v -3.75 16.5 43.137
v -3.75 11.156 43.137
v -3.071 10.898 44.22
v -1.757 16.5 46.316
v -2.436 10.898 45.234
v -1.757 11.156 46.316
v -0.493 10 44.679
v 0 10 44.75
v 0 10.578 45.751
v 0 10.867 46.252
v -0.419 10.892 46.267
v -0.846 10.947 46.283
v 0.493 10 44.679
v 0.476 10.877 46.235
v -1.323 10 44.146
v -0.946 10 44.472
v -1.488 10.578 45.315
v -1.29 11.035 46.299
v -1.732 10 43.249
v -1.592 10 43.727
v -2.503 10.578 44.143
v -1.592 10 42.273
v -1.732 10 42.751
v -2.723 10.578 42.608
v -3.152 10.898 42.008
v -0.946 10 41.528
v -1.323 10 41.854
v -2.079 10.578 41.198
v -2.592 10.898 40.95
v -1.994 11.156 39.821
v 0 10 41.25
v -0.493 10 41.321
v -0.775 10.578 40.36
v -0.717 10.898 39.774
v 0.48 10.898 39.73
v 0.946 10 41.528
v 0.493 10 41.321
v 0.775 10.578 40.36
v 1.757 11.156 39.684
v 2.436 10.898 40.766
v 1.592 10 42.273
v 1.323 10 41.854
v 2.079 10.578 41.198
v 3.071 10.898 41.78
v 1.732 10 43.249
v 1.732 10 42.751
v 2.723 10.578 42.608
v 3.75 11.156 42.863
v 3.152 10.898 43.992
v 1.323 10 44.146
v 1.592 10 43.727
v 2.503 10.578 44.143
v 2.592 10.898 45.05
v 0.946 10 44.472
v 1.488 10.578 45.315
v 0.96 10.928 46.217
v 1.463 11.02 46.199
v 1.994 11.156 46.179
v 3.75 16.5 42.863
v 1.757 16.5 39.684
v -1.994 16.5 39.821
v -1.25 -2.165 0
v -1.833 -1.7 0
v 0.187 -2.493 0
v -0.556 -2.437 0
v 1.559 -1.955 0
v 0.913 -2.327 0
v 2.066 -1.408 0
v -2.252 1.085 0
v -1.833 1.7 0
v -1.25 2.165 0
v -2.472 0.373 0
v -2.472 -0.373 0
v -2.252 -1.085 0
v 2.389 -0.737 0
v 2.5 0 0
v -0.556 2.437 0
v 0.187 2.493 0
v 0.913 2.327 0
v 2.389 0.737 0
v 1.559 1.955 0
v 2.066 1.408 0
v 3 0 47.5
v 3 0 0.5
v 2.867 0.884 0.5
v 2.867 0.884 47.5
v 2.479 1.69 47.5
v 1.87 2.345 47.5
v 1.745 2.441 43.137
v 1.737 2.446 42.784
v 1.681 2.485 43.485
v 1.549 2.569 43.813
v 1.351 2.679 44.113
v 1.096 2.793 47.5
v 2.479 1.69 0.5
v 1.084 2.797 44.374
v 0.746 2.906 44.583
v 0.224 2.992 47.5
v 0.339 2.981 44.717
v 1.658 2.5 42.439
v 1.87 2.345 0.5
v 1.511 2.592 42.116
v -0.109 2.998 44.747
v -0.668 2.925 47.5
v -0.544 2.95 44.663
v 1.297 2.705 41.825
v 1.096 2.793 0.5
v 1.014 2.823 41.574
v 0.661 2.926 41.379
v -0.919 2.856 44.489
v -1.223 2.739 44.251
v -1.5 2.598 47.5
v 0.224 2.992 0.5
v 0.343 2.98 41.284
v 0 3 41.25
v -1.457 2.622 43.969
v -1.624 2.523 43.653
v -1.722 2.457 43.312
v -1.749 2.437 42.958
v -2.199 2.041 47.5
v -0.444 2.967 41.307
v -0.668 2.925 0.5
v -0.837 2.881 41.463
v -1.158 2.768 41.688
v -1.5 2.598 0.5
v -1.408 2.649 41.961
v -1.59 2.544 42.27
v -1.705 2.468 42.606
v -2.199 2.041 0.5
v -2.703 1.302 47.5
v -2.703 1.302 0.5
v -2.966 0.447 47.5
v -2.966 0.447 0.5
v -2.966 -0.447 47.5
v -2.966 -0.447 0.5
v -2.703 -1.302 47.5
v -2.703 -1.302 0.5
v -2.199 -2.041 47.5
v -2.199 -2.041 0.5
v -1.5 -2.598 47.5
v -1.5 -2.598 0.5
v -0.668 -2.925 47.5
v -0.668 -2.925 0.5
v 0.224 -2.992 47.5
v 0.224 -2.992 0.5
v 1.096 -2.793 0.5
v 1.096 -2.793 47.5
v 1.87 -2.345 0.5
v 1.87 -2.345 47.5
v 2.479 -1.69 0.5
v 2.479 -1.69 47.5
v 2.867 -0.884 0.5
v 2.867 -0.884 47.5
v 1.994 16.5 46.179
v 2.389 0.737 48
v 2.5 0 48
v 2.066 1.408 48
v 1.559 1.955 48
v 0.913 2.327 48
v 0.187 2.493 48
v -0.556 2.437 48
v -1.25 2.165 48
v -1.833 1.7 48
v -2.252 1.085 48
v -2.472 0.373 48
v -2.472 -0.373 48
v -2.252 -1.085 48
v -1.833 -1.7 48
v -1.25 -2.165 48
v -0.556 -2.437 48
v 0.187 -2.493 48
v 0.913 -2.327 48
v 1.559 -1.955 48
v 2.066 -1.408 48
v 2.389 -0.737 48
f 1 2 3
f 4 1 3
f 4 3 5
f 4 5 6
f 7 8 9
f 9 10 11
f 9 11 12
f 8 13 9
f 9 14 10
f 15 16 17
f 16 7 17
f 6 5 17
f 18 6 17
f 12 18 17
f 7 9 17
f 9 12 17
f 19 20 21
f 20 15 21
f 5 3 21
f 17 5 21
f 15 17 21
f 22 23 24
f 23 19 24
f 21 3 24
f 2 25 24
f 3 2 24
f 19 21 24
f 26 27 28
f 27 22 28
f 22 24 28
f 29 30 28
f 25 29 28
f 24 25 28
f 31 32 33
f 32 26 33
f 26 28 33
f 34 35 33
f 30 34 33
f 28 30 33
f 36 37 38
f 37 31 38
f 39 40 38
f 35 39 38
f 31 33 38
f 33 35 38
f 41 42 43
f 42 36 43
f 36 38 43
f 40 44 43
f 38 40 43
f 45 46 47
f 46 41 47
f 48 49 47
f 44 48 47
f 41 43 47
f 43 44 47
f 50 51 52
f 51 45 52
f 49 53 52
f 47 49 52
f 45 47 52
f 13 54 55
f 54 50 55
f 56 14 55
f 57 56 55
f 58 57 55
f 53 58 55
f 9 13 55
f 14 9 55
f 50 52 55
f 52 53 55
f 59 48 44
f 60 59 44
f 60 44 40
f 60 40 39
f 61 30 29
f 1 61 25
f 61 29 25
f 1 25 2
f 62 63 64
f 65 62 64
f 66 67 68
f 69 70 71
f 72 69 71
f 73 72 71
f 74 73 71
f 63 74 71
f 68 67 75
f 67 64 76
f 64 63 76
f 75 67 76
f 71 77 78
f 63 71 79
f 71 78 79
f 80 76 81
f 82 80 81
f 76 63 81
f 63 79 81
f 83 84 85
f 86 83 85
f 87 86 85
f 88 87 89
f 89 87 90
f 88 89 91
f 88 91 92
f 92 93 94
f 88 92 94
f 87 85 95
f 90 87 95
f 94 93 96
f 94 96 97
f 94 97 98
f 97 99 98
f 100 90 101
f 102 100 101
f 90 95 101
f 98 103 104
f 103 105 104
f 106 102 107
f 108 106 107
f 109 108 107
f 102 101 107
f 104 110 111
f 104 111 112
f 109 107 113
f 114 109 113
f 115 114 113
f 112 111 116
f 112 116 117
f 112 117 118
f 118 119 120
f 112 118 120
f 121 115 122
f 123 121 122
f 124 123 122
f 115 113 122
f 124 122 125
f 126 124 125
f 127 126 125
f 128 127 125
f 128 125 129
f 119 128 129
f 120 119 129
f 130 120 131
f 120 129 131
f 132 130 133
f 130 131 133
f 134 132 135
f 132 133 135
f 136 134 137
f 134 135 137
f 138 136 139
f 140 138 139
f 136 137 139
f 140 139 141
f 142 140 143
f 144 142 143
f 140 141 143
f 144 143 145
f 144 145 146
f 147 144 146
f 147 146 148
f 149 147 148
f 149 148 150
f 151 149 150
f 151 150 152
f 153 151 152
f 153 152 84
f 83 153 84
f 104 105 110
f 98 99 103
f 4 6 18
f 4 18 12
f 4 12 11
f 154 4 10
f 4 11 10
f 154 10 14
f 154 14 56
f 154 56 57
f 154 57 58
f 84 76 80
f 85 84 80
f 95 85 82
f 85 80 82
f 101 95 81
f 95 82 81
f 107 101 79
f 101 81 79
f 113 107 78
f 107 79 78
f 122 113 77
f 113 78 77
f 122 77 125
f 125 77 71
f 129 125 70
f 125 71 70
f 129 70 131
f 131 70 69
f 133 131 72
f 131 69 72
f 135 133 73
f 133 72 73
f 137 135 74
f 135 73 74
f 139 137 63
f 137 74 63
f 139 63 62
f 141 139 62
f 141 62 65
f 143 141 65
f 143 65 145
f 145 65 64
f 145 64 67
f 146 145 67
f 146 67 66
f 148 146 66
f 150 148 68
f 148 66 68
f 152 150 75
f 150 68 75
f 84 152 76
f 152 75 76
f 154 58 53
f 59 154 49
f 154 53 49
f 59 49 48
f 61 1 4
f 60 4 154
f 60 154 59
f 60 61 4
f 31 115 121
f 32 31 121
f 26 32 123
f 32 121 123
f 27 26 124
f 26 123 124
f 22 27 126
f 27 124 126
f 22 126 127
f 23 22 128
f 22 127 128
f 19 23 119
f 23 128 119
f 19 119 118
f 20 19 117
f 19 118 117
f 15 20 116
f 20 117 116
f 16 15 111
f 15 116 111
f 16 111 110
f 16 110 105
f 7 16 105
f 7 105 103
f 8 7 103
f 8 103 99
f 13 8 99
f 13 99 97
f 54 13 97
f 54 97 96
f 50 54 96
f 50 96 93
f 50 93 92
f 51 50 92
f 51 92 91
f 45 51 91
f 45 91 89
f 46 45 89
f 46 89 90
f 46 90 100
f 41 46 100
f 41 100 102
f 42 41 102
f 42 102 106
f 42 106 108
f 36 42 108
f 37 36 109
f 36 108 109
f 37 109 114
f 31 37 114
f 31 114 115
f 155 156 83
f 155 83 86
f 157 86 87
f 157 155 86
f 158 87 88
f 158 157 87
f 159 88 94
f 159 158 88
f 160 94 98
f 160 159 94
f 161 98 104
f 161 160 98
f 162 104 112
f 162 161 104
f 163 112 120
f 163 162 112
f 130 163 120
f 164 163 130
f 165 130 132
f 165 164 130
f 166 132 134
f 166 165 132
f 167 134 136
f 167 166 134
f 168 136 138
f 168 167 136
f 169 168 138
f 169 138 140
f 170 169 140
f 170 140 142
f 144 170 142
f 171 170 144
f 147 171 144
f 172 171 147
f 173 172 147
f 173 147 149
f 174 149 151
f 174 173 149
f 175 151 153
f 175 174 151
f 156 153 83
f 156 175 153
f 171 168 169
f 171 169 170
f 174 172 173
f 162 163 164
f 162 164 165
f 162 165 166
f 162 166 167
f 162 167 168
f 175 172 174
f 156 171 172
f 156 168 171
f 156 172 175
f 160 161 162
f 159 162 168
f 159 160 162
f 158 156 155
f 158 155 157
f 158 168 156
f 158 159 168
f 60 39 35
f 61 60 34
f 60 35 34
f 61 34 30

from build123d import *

# Parameters (mm, degrees)
SKETCH_1_R      = 3
EXTRUDE_1_DEPTH = 48
SKETCH_2_R      = 1.75
EXTRUDE_2_DEPTH = 10
EXTRUDE_3_DEPTH = 6.5
CHAMFER_1_SIZE  = 0.5


with BuildPart() as part:
    # 草图1 → 凸台-拉伸1 (new body)
    with BuildSketch(Plane.XY):
        Circle(SKETCH_1_R)
    extrude(amount=EXTRUDE_1_DEPTH)

    # 草图2 → 凸台-拉伸2 (add)
    with BuildSketch(Plane(origin=(0, 0, 0), x_dir=(1, 0, 0), z_dir=(0, 1, 0))):
        with Locations(Location((0, -43, 0), (0, 0, 90))):
            Circle(SKETCH_2_R)
    extrude(amount=EXTRUDE_2_DEPTH)

    # 草图3 → 凸台-拉伸3 (add)
    with BuildSketch(Plane(origin=(0, 10, 0), x_dir=(1, 0, 0), z_dir=(0, 1, 0))):
        Polygon((-1.993644271, -39.820579321), (-3.750281213, -43.136836245), (-1.756636942, -46.316256924), (1.993644271, -46.179420679), (3.750281213, -42.863163755), (1.756636942, -39.683743076), align=None)
    extrude(amount=EXTRUDE_3_DEPTH)

    # 草图4 → 切除-旋转1 (revolve, cut)
    with BuildSketch(Plane(origin=(0, 0, 0), x_dir=(0, 0, -1), z_dir=(1, 0, 0))):
        Polygon((-44.75, 10), (-47.118639965, 11.367534921), (-47.118639965, 10), align=None)
    revolve(axis=Axis((0, 10, 43), (0, -1, 0)), mode=Mode.SUBTRACT)

    # 倒角1
    chamfer_1_edges = [part.edges().sort_by_distance(p)[0] for p in [
        (-3, 0, 0),
        (-3, 0, 48),
    ]]
    chamfer(chamfer_1_edges, length=CHAMFER_1_SIZE)


solid = part.part
